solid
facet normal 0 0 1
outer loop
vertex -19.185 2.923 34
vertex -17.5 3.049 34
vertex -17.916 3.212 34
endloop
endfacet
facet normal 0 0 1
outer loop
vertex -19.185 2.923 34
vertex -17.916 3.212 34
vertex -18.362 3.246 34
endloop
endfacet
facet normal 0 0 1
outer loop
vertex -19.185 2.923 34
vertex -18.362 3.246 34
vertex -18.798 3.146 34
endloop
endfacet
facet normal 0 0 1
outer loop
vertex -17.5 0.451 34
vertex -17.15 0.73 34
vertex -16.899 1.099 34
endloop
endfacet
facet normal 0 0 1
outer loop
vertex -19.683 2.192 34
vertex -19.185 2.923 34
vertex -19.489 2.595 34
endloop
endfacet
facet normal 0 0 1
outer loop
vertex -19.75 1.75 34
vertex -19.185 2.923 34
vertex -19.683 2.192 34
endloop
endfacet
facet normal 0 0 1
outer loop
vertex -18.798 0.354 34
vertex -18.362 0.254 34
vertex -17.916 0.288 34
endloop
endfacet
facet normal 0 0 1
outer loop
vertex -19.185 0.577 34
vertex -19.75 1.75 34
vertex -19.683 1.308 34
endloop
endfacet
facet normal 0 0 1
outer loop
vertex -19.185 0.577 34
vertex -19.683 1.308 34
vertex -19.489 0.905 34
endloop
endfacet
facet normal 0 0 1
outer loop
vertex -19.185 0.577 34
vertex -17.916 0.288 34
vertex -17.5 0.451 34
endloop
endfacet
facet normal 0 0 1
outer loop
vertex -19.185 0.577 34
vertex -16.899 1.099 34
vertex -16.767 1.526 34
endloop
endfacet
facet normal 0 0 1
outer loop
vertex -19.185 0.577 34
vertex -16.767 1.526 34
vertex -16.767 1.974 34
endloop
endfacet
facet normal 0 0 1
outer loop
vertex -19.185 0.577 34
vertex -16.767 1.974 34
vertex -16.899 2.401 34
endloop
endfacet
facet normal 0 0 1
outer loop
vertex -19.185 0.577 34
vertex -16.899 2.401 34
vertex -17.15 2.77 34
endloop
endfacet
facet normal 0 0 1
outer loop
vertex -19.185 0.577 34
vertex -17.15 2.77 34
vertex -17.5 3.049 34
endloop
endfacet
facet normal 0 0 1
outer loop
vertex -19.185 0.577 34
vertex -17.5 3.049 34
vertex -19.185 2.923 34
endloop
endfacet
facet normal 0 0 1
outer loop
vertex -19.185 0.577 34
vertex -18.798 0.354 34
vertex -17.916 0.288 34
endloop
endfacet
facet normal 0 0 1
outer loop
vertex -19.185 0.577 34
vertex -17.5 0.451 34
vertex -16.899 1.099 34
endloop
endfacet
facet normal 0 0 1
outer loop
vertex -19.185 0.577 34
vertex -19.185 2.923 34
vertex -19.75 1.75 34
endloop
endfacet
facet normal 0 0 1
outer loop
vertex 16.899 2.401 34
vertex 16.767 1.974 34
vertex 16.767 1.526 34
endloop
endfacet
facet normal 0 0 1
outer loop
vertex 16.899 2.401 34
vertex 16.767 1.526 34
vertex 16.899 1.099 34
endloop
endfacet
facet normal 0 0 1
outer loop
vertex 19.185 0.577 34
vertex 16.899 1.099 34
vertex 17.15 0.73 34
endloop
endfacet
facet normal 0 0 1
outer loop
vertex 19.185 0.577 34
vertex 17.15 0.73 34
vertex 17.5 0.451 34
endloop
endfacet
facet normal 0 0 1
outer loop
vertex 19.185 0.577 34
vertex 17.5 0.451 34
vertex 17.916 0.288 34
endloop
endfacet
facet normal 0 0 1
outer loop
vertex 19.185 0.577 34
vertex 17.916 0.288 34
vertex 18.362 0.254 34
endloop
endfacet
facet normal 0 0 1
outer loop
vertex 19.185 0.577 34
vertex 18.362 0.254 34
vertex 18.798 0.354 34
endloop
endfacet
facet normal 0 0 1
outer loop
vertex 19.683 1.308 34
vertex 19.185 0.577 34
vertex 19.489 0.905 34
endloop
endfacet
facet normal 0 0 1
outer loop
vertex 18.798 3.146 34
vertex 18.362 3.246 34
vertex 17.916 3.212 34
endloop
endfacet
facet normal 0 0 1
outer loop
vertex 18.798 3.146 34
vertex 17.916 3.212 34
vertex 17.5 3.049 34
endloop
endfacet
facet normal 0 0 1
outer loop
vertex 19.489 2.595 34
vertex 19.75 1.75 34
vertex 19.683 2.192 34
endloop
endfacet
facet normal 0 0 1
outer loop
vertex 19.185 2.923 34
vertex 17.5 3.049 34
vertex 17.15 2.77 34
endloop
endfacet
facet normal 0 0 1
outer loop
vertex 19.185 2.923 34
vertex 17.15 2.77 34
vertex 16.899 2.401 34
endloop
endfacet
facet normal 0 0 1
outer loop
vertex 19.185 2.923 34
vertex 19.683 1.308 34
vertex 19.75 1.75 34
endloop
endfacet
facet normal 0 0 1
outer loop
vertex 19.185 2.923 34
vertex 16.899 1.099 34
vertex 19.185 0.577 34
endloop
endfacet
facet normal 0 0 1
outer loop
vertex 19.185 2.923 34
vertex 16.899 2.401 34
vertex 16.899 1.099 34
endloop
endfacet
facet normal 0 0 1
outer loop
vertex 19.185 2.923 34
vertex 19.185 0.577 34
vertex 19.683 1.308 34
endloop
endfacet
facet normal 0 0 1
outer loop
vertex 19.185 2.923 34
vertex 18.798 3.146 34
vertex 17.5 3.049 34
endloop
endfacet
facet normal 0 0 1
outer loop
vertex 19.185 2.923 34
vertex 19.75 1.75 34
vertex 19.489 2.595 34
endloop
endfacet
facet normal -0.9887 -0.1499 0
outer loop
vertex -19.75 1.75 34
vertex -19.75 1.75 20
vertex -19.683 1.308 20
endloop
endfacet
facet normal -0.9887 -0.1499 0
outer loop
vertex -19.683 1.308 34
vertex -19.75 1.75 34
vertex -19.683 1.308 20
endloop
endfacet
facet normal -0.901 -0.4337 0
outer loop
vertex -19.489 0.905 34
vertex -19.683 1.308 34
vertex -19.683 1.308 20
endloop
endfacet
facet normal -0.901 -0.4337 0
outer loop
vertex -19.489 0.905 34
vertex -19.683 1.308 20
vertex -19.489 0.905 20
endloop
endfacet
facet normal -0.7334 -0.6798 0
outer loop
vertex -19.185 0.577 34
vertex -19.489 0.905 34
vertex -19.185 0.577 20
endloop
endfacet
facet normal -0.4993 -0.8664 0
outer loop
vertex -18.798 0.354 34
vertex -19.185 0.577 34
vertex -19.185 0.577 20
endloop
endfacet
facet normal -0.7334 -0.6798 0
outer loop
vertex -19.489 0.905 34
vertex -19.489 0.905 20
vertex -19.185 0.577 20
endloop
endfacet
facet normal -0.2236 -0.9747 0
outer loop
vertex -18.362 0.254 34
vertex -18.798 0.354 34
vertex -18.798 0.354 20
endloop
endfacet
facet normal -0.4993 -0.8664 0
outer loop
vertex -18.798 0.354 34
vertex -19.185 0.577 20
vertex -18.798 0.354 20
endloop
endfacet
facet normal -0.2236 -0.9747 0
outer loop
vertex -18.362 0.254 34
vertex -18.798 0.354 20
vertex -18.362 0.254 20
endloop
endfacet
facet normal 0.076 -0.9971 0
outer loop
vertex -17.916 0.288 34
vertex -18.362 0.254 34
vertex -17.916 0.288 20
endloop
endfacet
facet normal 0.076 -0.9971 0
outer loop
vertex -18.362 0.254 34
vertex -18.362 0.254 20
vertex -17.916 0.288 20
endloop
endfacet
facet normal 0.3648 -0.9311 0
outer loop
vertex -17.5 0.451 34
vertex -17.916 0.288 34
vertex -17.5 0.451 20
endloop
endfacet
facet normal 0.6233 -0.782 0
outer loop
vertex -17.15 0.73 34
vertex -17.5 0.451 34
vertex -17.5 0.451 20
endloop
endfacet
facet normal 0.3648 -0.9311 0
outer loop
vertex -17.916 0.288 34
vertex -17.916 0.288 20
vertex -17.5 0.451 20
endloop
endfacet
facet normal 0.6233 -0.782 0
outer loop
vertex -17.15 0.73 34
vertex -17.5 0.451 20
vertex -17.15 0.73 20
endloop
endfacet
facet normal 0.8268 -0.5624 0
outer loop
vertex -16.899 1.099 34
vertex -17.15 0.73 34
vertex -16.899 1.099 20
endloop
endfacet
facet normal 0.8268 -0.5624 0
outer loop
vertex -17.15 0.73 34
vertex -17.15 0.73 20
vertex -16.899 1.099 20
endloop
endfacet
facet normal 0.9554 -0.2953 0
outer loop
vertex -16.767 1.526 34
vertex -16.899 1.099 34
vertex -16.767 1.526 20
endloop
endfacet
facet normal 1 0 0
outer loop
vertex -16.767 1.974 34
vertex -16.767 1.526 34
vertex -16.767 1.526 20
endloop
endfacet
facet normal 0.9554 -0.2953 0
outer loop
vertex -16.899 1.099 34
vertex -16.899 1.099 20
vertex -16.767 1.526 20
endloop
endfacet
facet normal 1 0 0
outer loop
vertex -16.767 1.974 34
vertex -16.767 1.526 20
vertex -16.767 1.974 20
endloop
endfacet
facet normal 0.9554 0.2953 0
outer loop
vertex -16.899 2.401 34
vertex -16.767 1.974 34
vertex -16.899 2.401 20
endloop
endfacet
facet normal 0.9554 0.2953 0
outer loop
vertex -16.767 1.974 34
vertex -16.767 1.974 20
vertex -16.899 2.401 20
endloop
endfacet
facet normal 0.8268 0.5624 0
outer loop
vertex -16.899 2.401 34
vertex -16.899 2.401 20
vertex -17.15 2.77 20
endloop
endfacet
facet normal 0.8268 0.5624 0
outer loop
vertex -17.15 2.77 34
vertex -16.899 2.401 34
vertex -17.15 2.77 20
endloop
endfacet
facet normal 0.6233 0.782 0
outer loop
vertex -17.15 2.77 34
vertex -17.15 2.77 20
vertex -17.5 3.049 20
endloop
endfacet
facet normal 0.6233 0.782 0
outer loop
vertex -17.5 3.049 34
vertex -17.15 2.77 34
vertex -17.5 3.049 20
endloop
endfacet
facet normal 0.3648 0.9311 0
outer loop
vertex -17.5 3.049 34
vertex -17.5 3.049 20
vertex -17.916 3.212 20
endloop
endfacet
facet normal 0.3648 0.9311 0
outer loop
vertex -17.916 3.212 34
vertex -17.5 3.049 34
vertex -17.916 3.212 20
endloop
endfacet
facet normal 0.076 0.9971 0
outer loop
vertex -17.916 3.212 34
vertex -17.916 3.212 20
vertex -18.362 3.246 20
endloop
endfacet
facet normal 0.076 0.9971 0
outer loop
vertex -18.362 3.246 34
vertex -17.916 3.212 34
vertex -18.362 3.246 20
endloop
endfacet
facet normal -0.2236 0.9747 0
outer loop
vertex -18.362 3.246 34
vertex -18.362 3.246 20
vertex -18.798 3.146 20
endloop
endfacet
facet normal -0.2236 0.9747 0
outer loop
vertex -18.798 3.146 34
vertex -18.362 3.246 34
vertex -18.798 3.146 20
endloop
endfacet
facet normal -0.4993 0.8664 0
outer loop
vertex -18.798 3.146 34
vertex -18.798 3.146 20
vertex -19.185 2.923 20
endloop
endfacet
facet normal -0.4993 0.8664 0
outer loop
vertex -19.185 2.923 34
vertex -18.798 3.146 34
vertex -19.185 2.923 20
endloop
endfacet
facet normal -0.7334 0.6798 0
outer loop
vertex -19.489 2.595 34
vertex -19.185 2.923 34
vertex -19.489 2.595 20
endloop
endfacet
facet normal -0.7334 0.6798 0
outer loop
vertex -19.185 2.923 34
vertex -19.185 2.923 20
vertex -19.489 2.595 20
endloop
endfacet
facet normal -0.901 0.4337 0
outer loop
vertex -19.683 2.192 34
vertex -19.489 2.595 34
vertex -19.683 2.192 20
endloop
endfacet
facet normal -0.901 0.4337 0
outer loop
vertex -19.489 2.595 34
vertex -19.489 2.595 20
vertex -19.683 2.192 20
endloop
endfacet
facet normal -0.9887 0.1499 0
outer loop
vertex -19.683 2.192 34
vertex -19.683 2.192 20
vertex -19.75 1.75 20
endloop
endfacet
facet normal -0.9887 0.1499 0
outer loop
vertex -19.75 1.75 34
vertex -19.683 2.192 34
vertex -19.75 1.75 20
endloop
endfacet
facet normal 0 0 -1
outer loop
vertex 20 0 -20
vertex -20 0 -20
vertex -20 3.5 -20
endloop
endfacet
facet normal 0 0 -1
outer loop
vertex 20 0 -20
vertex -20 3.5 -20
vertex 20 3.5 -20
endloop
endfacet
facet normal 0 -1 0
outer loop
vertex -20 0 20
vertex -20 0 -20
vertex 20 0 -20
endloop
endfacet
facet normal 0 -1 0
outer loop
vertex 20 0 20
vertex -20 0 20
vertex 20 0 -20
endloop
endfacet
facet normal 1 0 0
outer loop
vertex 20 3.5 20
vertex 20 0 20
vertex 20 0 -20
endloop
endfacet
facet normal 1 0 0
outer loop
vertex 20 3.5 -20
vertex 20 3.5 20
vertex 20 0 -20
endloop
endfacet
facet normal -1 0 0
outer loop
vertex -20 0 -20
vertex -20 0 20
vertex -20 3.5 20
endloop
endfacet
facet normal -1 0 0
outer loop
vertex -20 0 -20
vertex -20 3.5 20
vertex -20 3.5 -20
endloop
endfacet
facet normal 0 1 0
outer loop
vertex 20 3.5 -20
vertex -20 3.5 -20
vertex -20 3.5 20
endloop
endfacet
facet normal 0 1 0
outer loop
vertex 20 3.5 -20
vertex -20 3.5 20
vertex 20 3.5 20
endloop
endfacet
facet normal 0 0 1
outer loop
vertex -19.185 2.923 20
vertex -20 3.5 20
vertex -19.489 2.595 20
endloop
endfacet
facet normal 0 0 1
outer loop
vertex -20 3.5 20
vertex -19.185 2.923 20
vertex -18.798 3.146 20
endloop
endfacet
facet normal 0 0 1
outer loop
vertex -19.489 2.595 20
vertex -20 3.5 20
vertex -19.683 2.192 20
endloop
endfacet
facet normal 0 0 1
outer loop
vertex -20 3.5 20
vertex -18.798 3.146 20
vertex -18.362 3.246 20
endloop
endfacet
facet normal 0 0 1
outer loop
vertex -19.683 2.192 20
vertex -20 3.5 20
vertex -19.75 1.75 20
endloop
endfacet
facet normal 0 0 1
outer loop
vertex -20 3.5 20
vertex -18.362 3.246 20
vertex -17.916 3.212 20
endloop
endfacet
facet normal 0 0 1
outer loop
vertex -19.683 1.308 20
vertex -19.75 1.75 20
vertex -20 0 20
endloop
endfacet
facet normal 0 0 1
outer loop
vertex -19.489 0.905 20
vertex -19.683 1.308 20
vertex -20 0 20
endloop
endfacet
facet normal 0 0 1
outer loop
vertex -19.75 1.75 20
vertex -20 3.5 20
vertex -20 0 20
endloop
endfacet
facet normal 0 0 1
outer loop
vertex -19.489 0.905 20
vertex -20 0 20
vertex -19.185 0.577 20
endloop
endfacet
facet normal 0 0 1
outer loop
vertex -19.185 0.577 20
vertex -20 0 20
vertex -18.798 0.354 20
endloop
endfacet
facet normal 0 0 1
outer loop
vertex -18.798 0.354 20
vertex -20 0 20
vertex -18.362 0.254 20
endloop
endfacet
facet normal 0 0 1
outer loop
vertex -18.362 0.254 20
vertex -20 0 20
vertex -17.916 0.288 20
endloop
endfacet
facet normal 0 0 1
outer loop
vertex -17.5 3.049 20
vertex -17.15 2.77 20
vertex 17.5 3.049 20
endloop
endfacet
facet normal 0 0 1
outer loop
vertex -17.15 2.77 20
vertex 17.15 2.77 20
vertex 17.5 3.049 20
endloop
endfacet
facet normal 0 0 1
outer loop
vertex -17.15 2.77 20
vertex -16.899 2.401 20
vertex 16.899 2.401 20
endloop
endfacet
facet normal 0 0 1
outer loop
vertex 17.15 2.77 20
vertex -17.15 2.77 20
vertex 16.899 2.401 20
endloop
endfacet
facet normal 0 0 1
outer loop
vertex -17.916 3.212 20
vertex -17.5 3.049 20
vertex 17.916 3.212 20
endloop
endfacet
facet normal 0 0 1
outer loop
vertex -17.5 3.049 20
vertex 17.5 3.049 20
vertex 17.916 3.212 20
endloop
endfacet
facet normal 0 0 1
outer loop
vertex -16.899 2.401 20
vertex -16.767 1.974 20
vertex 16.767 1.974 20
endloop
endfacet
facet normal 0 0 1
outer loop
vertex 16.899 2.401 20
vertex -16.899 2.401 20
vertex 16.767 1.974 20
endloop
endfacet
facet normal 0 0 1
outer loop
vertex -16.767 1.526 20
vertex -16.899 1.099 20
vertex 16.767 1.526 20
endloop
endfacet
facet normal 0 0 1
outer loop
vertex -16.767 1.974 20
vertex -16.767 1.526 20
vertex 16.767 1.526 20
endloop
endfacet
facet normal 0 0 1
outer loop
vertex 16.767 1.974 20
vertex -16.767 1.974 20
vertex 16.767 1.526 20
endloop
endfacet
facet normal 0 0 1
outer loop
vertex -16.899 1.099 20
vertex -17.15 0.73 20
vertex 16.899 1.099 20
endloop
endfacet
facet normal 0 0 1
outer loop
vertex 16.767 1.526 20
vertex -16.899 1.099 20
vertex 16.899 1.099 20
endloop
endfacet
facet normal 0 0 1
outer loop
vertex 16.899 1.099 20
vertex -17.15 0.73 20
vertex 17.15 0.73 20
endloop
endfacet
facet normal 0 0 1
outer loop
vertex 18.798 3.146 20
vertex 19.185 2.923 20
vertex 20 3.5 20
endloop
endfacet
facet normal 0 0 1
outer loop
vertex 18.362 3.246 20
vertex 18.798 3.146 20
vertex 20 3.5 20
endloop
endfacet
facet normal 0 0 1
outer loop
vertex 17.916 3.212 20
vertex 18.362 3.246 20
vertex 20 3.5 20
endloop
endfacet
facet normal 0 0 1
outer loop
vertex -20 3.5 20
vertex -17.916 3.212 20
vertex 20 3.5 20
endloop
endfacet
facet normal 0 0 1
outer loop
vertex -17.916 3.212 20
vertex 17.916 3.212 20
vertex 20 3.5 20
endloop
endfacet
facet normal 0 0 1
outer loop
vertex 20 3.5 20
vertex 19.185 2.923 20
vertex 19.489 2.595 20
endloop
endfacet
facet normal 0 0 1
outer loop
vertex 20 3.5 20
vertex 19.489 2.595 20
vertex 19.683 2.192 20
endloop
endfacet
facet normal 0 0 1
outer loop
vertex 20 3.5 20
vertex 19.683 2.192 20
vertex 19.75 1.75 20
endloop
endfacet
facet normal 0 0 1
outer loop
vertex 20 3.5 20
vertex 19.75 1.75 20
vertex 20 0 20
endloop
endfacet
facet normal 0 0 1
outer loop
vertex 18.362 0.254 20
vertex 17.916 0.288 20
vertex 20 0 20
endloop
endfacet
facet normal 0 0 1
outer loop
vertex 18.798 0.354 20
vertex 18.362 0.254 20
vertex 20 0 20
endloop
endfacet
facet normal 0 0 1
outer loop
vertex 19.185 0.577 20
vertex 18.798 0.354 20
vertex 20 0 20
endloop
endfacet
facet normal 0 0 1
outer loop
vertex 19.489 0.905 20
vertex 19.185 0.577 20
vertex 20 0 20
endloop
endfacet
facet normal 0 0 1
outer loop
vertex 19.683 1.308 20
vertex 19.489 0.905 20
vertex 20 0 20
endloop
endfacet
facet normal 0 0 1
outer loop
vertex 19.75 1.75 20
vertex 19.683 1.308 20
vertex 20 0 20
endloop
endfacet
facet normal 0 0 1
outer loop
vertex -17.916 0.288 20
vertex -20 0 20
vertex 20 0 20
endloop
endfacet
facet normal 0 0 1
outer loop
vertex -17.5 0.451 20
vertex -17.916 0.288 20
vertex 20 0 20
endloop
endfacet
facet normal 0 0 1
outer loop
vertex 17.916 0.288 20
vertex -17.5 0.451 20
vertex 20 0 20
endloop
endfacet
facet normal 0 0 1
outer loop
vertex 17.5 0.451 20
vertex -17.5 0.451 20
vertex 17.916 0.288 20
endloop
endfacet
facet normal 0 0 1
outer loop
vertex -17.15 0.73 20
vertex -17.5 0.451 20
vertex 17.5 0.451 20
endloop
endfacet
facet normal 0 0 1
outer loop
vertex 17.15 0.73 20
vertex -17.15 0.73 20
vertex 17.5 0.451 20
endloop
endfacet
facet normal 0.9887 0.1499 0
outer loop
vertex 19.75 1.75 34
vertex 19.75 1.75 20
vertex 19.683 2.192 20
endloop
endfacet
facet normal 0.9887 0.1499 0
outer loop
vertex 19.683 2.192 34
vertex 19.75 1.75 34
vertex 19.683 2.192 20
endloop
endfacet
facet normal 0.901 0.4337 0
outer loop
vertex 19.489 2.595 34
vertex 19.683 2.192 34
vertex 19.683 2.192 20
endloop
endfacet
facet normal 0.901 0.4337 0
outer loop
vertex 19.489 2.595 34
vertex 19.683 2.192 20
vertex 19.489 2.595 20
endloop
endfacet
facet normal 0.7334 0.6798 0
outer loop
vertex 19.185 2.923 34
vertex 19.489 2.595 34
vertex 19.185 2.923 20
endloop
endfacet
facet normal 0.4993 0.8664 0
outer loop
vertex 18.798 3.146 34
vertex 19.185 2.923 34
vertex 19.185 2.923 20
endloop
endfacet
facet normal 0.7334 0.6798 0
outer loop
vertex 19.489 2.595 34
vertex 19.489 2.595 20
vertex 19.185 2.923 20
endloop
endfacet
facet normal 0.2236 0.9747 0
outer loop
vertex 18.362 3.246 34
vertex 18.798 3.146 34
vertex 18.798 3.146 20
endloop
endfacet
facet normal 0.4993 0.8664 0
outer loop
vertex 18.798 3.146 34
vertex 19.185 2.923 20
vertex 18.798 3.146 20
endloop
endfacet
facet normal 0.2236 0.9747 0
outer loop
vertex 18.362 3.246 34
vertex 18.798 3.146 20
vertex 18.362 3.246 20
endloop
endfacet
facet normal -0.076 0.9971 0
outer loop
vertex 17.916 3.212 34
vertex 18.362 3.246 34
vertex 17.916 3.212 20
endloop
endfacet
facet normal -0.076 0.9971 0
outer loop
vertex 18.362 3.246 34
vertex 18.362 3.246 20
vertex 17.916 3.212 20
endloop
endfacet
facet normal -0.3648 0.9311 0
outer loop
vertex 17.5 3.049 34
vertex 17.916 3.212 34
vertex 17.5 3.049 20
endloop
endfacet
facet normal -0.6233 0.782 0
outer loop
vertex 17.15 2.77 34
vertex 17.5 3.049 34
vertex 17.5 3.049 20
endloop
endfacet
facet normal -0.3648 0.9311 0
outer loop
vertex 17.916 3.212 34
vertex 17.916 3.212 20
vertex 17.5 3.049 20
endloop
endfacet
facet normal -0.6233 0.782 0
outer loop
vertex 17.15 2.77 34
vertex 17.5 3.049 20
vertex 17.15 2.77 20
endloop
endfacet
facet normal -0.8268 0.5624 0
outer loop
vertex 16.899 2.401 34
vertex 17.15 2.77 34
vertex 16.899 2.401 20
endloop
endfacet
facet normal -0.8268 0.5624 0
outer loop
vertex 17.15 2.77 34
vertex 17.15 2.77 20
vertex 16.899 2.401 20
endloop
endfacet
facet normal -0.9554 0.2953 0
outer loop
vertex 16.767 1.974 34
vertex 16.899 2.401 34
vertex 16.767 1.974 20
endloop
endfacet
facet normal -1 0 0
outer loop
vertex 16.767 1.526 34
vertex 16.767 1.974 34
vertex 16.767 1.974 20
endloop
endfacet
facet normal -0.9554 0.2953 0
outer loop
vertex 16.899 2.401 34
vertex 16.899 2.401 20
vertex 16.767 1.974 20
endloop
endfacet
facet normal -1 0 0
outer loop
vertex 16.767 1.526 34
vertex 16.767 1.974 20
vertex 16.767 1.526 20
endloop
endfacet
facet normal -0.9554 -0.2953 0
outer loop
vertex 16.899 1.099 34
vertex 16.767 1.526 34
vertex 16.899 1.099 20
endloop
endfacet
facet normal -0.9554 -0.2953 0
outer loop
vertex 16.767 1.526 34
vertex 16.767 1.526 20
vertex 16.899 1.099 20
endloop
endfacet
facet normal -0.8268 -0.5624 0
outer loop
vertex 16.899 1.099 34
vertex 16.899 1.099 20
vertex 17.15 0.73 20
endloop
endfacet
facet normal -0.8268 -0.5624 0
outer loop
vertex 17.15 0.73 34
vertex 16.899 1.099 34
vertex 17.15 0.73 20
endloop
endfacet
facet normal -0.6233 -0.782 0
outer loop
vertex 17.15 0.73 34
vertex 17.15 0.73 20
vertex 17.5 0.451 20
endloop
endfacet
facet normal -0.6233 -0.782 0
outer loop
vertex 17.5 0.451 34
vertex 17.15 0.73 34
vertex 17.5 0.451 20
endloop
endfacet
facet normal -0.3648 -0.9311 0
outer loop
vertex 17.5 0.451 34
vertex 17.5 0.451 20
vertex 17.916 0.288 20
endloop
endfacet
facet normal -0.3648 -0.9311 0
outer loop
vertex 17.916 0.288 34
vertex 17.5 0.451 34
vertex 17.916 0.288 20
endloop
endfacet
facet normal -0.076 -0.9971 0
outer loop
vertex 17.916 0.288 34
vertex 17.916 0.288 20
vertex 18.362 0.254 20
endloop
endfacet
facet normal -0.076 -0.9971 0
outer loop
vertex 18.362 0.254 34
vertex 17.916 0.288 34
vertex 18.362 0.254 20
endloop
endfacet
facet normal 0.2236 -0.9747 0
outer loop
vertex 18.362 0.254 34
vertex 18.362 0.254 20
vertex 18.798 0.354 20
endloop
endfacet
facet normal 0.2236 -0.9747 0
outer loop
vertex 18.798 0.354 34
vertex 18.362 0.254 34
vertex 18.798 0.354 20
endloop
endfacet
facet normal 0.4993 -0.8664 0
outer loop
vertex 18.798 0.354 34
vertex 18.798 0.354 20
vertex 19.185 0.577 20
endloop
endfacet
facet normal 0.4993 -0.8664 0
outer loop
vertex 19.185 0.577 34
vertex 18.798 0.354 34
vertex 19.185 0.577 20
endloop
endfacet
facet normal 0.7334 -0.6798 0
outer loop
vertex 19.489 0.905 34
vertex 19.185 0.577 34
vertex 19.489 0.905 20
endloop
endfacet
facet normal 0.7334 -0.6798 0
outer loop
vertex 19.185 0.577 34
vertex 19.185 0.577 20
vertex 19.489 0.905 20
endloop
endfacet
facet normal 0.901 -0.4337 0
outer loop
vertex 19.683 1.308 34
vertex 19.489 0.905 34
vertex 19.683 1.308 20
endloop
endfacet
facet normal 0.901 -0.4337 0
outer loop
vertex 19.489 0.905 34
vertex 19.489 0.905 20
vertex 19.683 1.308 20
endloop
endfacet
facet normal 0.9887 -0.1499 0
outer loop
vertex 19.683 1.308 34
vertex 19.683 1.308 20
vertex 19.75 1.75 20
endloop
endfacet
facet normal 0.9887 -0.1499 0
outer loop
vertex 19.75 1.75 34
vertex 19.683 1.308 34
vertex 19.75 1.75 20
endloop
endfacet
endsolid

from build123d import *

# Parameters (mm, degrees)
SKETCH1_W           = 40
SKETCH1_H           = 40
BOSS_EXTRUDE1_DEPTH = 3.5
SKETCH2_R           = 1.5
BOSS_EXTRUDE2_DEPTH = 14


with BuildPart() as part:
    # Sketch1 → Boss-Extrude1 (new body)
    with BuildSketch(Plane(origin=(0, 0, 0), x_dir=(1, 0, 0), z_dir=(0, 1, 0))):
        Rectangle(SKETCH1_W, SKETCH1_H)
    extrude(amount=BOSS_EXTRUDE1_DEPTH)

    # Sketch2 → Boss-Extrude2 (add)
    with BuildSketch(Plane.XY.offset(20)):
        with Locations((18.25, 1.75)):
            Circle(SKETCH2_R)
        with Locations(Location((-18.25, 1.75, 0), (0, 0, 180))):
            Circle(SKETCH2_R)
    extrude(amount=BOSS_EXTRUDE2_DEPTH)


solid = part.part
